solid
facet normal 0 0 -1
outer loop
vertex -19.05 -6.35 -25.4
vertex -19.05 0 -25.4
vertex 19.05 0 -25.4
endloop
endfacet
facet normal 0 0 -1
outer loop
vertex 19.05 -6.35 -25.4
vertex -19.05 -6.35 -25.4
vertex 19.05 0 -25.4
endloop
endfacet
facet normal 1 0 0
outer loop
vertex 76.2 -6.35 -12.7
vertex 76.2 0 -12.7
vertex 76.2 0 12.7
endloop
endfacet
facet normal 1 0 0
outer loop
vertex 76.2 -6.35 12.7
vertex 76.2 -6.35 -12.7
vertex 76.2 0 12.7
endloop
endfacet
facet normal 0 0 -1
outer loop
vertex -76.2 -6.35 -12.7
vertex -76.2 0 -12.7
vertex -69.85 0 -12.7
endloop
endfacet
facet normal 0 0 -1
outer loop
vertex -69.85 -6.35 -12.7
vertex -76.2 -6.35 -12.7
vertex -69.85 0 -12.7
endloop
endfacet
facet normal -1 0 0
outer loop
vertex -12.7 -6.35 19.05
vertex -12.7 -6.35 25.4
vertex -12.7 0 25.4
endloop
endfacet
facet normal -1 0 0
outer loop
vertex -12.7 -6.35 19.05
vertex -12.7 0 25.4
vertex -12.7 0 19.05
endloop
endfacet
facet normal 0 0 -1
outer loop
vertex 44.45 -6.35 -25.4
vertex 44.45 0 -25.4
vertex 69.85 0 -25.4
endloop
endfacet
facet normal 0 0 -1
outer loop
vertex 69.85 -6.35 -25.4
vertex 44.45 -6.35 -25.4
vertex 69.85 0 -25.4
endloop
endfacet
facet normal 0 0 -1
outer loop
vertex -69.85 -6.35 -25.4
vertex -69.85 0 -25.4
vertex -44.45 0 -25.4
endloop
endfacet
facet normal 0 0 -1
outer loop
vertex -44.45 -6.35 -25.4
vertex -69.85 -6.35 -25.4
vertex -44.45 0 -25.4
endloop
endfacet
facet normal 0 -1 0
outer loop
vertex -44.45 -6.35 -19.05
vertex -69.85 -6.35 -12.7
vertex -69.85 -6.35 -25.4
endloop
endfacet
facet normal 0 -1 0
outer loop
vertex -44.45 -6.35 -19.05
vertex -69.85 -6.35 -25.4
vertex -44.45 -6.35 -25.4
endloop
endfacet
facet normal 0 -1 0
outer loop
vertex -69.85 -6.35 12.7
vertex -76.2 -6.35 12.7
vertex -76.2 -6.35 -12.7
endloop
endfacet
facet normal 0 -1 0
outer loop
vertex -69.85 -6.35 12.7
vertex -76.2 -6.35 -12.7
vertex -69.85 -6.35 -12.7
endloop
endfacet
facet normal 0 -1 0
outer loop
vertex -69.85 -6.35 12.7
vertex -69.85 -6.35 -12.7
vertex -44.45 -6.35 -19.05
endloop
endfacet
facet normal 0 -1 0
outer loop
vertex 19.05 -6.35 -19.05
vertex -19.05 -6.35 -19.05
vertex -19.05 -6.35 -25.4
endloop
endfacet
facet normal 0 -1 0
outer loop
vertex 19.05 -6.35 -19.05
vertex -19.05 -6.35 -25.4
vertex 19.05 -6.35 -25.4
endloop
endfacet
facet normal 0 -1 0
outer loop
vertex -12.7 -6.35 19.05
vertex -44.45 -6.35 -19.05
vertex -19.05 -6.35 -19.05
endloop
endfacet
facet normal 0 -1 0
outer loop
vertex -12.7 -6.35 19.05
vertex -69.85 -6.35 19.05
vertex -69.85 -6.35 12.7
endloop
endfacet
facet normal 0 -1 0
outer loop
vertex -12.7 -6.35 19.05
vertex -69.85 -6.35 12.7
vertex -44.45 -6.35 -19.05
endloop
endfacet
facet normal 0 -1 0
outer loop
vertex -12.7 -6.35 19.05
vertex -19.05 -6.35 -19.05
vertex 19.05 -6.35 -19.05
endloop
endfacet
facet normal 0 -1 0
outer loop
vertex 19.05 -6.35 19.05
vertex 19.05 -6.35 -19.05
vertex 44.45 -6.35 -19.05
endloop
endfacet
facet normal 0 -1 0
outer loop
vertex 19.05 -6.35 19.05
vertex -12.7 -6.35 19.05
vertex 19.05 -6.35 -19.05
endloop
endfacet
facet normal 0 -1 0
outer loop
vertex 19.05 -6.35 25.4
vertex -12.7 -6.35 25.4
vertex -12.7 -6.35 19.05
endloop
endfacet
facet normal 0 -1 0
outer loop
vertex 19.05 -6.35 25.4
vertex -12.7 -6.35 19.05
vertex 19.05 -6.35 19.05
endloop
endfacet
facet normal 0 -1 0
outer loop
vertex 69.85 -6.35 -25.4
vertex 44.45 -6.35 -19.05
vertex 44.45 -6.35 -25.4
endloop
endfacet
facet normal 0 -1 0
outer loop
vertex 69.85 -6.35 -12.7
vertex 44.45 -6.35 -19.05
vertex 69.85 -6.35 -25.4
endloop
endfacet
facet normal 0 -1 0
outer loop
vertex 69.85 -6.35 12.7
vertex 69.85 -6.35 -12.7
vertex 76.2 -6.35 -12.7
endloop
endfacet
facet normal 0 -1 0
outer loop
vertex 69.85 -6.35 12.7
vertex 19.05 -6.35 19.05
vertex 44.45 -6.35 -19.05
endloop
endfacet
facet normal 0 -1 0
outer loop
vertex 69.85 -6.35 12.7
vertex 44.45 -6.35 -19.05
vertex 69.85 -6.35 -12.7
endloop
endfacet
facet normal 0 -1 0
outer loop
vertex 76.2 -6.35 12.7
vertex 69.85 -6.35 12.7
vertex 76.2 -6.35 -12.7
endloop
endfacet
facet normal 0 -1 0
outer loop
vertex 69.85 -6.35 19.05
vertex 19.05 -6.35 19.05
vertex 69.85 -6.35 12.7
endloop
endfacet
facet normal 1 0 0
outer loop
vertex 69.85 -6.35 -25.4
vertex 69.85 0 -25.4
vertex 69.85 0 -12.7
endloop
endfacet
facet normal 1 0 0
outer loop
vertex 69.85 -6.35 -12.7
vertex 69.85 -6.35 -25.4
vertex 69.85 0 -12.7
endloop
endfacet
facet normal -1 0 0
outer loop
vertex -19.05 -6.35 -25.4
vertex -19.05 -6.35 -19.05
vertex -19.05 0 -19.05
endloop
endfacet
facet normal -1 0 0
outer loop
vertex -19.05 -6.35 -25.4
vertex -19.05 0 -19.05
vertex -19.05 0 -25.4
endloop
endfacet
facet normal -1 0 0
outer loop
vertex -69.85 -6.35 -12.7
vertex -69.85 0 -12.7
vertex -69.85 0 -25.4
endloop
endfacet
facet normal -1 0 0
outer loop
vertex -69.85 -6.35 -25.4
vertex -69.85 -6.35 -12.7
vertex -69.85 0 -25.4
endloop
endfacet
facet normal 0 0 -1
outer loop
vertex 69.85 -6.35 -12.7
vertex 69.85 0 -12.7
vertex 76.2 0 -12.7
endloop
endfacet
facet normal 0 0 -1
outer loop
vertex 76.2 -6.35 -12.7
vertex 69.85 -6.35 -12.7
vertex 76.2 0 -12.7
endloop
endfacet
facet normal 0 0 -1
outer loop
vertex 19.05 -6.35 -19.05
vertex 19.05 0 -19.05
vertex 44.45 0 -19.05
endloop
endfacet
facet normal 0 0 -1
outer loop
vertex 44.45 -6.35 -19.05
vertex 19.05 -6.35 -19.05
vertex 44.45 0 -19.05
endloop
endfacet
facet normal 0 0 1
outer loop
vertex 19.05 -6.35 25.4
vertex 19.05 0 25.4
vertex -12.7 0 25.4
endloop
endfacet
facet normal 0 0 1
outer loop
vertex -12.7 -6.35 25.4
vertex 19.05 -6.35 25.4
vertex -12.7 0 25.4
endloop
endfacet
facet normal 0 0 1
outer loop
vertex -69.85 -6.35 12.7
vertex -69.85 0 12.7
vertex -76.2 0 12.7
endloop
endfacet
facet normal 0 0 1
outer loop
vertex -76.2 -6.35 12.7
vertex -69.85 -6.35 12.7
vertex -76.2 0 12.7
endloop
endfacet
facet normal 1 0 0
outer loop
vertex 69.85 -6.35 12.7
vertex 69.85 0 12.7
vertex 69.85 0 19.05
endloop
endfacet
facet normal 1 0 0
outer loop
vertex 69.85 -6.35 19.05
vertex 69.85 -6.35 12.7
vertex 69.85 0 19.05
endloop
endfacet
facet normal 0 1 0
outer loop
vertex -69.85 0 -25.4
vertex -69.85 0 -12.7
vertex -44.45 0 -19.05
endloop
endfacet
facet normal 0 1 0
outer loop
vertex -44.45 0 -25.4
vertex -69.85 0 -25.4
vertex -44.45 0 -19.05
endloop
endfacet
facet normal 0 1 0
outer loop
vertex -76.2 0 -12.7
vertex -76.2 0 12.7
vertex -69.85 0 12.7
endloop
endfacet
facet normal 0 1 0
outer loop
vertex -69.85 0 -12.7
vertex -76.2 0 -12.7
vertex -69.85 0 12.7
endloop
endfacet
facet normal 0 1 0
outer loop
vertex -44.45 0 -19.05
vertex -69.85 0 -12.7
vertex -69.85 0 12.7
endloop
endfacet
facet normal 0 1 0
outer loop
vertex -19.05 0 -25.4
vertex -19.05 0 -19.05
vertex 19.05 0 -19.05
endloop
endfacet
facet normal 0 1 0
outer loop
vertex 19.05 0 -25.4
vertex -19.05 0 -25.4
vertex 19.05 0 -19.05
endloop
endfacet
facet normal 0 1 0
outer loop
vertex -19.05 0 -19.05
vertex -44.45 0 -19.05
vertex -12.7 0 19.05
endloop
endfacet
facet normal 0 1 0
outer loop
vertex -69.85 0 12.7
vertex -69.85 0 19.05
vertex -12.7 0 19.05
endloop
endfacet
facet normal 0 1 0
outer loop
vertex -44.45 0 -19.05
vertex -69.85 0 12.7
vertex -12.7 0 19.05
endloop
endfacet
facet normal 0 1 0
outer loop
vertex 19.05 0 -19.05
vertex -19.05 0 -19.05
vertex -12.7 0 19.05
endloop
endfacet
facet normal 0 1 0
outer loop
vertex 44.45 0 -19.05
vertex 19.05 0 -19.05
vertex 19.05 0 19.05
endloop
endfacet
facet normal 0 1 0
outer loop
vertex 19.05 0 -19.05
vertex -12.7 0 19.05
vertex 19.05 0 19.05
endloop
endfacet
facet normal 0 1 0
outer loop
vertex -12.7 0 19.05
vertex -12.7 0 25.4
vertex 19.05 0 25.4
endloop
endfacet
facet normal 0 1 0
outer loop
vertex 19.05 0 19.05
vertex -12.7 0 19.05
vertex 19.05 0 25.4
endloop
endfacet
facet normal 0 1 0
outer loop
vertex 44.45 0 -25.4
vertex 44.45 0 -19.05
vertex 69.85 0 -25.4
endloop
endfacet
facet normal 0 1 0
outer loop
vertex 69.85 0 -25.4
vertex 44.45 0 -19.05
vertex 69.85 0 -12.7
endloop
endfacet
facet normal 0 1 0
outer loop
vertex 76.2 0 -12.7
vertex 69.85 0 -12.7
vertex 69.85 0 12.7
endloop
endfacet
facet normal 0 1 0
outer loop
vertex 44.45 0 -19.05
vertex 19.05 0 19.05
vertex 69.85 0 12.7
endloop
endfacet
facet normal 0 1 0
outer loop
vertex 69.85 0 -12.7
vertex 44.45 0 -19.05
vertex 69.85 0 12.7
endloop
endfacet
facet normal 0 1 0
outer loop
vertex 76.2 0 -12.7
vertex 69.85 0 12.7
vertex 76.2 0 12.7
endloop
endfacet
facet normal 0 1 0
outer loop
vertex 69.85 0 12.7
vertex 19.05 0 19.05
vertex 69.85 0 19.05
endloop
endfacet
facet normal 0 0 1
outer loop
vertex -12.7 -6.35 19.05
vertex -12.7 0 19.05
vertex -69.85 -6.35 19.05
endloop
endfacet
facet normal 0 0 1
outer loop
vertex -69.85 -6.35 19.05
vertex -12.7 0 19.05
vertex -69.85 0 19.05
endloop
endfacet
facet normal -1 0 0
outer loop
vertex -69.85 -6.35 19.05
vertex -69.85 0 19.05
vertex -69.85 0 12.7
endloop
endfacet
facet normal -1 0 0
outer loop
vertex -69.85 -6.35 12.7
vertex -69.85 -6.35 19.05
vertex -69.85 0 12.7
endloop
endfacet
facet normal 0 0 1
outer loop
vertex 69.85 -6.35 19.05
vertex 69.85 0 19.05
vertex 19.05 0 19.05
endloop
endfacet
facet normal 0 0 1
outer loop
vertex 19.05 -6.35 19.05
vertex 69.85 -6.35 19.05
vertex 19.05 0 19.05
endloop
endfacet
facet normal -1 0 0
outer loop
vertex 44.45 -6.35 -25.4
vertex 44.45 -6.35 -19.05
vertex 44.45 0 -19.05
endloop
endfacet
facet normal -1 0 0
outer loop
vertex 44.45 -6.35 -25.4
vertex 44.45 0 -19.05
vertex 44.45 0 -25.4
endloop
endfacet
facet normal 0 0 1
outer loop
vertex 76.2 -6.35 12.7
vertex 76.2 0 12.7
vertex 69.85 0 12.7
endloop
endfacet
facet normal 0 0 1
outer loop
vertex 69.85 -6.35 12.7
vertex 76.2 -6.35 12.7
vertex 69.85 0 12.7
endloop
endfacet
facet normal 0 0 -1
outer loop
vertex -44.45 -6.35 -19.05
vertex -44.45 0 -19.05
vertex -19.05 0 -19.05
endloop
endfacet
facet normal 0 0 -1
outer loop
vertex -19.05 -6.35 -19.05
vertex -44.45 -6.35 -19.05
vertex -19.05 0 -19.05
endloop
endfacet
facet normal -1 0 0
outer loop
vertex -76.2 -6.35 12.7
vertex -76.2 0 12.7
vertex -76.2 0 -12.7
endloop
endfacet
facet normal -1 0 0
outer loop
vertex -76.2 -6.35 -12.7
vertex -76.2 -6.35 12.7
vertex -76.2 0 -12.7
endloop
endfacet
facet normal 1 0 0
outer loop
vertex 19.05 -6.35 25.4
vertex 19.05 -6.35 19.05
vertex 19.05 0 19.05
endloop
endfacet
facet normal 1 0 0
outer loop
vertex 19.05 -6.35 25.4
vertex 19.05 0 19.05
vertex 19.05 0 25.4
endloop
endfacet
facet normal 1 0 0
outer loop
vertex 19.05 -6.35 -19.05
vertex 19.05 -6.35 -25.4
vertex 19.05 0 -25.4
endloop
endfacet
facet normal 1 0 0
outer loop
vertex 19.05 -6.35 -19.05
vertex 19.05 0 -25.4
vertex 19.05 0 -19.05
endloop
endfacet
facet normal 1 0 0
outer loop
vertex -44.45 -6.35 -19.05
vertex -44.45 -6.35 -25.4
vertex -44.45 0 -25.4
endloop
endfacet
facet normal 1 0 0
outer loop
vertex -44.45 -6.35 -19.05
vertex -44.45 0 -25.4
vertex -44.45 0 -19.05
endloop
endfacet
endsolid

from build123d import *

# Parameters (mm, degrees)
F1_DEPTH = 6.35


with BuildPart() as f1:
    # F0 (on Front) → F1 (new body)
    with BuildSketch(Plane.XZ):
        Polygon((-69.85, 12.7), (-76.2, 12.7), (-76.2, 6.35), (-76.2, 0), (-76.2, -6.35), (-76.2, -12.7), (-69.85, -12.7), (-69.85, -19.05), (-69.85, -25.4), (-63.5, -25.4), (-57.15, -25.4), (-50.8, -25.4), (-44.45, -25.4), (-44.45, -19.05), (-38.1, -19.05), (-31.75, -19.05), (-25.4, -19.05), (-19.05, -19.05), (-19.05, -25.4), (-12.7, -25.4), (-6.35, -25.4), (0, -25.4), (6.35, -25.4), (12.7, -25.4), (19.05, -25.4), (19.05, -19.05), (25.4, -19.05), (31.75, -19.05), (38.1, -19.05), (44.45, -19.05), (44.45, -25.4), (50.8, -25.4), (57.15, -25.4), (63.5, -25.4), (69.85, -25.4), (69.85, -19.05), (69.85, -12.7), (76.2, -12.7), (76.2, -6.35), (76.2, 0), (76.2, 6.35), (76.2, 12.7), (69.85, 12.7), (69.85, 19.05), (63.5, 19.05), (57.15, 19.05), (50.8, 19.05), (44.45, 19.05), (38.1, 19.05), (31.75, 19.05), (25.4, 19.05), (19.05, 19.05), (19.05, 25.4), (12.7, 25.4), (6.35, 25.4), (0, 25.4), (-6.35, 25.4), (-12.7, 25.4), (-12.7, 19.05), (-19.05, 19.05), (-25.4, 19.05), (-31.75, 19.05), (-38.1, 19.05), (-44.45, 19.05), (-50.8, 19.05), (-57.15, 19.05), (-69.85, 19.05), align=None)
    extrude(amount=F1_DEPTH)


solid = f1.part
